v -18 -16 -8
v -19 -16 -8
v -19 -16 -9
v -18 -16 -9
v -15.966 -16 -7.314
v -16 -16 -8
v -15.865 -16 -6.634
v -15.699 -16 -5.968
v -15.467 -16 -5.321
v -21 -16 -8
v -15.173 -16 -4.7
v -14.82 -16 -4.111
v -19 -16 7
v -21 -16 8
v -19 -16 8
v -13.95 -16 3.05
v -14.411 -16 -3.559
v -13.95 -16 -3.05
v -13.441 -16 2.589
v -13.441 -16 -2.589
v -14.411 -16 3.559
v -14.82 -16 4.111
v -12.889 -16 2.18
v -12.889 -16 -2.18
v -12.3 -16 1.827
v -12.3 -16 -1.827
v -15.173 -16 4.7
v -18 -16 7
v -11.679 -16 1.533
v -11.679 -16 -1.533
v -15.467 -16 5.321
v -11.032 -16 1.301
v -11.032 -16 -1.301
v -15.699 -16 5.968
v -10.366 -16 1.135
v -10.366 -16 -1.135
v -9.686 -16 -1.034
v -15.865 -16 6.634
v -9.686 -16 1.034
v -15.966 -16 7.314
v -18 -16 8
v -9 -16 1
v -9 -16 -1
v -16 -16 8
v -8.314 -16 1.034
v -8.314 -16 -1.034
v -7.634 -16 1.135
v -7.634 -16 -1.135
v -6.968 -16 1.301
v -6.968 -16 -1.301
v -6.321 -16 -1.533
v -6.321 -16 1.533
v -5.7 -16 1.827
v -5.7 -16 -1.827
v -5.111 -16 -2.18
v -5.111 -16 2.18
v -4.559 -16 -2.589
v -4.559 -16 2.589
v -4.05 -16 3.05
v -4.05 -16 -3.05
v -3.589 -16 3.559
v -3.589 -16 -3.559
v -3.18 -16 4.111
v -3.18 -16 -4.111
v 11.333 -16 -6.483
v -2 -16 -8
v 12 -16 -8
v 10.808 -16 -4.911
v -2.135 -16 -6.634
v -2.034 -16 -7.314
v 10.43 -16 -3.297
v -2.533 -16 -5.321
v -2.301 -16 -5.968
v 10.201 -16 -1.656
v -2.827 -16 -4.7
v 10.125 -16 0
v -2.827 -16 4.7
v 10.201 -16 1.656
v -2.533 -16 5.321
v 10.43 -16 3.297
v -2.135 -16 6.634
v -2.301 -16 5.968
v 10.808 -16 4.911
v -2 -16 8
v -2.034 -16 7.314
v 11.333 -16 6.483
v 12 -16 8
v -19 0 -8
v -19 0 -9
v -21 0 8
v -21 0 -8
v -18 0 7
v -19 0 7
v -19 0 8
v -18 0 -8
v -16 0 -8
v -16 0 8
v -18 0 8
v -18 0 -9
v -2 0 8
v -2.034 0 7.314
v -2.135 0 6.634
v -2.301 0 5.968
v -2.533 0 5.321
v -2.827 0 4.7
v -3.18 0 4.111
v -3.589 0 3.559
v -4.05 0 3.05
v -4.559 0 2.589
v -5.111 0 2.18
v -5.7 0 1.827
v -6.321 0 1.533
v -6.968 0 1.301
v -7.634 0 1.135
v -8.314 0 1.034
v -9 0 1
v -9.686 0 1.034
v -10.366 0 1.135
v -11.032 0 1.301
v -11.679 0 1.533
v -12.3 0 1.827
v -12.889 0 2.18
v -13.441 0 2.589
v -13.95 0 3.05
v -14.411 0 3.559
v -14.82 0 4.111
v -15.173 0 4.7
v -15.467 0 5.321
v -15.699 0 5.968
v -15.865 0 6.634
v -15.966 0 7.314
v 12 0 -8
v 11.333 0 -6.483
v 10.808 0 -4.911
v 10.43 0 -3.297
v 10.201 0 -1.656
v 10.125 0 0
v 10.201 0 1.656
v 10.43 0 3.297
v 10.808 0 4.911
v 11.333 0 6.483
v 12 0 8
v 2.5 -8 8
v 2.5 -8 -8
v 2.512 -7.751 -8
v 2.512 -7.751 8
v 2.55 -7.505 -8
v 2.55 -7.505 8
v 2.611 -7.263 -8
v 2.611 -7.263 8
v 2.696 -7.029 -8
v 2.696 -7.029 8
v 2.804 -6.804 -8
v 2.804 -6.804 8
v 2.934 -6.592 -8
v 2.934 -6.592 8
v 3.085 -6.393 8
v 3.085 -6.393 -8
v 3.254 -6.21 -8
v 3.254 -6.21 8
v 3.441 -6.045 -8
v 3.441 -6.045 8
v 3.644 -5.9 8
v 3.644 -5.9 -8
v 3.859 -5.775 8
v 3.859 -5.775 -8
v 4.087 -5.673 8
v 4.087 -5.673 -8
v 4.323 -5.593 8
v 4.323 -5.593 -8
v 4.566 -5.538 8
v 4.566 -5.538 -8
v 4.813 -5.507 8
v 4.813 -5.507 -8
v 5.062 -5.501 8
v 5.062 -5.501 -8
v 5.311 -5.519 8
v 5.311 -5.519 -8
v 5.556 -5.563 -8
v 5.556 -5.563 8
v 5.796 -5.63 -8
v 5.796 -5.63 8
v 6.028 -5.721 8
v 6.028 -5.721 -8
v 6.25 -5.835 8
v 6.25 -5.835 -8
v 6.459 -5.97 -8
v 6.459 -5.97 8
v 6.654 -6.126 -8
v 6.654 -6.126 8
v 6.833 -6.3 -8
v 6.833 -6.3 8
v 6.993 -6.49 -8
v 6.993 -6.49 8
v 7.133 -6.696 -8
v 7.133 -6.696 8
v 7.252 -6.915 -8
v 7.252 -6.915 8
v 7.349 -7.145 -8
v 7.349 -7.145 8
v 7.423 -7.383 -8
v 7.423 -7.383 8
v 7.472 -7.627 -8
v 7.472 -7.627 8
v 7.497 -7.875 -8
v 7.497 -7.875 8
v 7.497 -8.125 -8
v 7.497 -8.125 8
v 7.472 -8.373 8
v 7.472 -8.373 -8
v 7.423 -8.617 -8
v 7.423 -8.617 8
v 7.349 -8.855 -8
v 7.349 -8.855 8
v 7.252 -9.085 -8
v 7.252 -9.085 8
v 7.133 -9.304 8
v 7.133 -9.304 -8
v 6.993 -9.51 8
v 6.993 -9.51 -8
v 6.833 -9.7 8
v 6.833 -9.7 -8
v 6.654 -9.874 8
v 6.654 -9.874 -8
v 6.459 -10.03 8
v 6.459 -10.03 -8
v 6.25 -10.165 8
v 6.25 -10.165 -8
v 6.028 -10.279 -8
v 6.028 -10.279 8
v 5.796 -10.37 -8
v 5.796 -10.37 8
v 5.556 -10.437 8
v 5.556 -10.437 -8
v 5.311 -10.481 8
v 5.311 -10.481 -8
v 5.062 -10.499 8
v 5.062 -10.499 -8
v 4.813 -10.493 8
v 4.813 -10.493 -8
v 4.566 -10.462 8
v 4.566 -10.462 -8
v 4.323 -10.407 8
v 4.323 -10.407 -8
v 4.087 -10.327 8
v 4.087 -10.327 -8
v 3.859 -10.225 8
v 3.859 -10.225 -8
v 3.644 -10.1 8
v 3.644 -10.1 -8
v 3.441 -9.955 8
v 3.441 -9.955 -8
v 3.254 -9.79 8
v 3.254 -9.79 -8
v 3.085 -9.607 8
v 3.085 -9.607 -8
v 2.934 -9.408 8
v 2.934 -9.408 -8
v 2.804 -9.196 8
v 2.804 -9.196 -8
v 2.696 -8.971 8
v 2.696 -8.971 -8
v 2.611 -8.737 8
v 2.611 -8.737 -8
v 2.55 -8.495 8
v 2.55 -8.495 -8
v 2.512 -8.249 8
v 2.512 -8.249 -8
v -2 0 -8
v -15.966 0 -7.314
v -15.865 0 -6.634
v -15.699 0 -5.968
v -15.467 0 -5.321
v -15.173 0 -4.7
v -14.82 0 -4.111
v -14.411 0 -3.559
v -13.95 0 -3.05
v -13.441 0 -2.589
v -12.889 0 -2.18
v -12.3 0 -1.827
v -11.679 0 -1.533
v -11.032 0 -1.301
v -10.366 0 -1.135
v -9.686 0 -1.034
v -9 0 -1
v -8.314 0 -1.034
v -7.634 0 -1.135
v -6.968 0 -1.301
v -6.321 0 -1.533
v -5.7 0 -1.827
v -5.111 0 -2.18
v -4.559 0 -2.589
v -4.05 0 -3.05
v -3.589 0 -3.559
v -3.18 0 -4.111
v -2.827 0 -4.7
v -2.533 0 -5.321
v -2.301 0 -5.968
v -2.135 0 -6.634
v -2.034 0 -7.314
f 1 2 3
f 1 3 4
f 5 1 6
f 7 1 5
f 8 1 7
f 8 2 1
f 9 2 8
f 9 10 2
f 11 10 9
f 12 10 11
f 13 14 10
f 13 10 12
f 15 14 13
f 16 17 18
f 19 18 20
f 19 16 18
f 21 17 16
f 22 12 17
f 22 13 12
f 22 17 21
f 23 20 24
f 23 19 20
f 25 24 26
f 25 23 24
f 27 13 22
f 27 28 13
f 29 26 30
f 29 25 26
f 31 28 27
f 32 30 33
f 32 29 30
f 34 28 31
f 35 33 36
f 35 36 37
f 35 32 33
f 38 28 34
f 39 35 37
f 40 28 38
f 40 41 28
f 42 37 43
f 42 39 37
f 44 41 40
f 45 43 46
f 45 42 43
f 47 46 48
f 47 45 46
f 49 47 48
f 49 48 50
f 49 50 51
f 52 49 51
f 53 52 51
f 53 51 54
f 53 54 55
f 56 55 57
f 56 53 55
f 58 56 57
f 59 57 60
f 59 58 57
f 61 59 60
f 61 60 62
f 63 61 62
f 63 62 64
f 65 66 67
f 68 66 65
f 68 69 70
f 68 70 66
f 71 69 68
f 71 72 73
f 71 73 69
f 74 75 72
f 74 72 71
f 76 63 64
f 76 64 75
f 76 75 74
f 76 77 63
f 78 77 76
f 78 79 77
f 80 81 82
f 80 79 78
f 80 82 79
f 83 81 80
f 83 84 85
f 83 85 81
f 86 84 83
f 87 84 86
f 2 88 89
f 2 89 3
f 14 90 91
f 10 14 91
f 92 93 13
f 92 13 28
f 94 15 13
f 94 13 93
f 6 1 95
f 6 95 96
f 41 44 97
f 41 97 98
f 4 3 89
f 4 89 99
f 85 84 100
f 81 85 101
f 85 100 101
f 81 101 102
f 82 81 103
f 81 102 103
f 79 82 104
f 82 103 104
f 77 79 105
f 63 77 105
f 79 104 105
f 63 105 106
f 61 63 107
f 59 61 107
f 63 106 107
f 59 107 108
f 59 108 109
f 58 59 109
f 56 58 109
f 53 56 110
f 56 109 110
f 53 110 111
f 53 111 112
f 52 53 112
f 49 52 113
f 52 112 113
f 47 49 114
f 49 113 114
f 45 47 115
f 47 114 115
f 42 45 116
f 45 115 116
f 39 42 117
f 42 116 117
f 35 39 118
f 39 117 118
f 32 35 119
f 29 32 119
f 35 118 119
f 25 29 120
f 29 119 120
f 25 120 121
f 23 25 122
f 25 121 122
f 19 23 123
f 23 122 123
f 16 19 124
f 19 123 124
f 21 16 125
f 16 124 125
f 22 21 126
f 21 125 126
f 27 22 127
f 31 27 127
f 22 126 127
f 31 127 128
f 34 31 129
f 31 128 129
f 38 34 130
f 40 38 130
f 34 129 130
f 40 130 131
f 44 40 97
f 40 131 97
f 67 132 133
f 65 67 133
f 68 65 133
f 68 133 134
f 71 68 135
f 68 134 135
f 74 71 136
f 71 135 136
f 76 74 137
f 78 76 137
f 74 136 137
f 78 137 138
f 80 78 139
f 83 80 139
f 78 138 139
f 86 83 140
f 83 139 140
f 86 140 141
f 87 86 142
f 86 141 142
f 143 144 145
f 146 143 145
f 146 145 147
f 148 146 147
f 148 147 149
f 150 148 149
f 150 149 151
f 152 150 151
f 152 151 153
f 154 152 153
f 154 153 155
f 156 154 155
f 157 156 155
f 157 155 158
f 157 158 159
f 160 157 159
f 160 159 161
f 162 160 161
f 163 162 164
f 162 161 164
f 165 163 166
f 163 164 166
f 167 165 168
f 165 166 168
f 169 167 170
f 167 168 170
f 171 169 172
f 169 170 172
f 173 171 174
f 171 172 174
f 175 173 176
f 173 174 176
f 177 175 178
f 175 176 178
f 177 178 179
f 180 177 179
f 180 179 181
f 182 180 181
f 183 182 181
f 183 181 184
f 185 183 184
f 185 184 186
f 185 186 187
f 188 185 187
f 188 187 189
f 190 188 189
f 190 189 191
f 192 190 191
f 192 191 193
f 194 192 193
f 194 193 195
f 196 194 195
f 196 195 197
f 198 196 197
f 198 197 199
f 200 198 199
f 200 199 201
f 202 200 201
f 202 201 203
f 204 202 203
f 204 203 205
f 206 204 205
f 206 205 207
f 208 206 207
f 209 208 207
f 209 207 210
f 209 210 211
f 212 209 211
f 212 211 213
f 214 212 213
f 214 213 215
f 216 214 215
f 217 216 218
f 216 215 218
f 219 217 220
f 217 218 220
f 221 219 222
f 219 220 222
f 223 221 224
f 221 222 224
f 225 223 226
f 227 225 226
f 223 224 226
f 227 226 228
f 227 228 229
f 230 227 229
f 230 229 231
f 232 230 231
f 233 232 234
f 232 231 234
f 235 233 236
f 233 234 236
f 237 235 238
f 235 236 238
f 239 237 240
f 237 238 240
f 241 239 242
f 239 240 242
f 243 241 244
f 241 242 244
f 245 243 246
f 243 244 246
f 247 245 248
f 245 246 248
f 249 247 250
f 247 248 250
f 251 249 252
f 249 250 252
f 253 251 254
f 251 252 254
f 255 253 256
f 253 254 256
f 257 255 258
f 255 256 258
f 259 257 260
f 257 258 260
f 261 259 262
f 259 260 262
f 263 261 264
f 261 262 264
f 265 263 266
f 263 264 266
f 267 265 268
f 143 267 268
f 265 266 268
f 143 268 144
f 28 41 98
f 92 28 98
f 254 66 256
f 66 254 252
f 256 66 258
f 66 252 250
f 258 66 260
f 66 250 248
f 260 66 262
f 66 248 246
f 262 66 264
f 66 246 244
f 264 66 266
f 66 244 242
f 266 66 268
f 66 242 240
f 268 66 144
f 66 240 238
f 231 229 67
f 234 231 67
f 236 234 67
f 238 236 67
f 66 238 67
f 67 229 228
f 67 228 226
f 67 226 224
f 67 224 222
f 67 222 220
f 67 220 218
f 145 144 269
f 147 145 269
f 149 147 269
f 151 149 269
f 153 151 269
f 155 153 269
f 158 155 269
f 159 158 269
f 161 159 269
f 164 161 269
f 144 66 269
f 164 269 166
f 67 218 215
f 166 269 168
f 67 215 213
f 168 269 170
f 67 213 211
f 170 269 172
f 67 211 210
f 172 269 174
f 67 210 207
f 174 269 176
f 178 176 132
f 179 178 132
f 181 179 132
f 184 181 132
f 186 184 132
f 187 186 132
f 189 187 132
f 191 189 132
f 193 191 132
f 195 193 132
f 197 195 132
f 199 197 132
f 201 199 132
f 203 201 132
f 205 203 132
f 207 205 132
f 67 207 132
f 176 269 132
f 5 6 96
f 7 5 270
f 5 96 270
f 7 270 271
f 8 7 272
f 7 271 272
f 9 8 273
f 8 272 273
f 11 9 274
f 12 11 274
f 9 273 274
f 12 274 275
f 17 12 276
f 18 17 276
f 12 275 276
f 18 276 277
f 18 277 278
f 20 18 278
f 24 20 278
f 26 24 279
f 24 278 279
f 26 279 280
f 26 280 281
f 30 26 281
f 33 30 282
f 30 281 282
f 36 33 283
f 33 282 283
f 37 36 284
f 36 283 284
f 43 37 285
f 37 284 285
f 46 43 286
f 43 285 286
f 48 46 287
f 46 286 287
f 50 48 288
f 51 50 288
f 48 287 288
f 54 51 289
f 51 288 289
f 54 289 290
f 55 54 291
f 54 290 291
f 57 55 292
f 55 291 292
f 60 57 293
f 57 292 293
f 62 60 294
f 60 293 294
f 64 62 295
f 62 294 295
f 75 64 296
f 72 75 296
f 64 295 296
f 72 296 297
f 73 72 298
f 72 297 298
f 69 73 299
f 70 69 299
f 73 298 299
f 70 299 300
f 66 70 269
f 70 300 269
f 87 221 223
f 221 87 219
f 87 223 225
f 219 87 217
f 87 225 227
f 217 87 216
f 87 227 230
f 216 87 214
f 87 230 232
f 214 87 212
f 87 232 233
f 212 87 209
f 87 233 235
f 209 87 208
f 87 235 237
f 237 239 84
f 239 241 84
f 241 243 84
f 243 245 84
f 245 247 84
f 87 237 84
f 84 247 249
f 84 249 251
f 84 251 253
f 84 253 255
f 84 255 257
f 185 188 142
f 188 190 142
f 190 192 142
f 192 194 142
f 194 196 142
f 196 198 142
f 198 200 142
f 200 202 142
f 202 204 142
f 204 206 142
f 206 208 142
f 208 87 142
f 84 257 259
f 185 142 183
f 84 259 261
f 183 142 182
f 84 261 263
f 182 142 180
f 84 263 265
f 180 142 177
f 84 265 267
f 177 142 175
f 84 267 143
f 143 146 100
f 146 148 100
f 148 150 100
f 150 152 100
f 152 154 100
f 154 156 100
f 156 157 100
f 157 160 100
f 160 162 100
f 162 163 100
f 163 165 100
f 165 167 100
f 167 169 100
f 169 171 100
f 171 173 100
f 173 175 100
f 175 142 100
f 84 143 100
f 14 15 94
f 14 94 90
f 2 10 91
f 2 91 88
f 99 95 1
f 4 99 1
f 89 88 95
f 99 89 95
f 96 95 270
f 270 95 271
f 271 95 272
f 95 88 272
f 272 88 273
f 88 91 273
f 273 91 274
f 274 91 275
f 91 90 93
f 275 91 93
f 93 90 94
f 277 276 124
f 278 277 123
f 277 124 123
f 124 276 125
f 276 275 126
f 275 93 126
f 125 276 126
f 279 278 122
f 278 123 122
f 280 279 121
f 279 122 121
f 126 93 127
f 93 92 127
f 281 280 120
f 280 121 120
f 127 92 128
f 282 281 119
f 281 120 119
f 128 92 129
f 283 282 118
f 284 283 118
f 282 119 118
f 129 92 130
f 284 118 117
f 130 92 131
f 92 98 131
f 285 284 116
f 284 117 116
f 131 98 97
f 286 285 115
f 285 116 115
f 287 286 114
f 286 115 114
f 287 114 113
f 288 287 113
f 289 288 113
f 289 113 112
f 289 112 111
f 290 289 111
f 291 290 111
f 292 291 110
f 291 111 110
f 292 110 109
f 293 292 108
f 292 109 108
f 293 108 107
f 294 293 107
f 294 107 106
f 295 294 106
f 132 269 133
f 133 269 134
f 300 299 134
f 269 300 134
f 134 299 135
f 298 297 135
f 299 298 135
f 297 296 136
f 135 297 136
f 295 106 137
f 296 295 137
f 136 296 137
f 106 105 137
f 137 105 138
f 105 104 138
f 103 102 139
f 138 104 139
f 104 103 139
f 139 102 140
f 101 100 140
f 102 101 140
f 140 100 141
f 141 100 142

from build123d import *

# Parameters (mm, degrees)
F1_DEPTH = 16
F3_D     = 5
F4_W     = 1
F4_H     = 16
F5_DEPTH = 1
F6_W     = 1
F6_H     = 16
F7_DEPTH = 1


# Not quite as in the source:
# - a feature names something its author has since deleted; it is built from what else it names


with BuildPart() as f1:
    # F0 (on Front) → F1 (new body)
    with BuildSketch(Plane.XZ):
        with BuildLine():
            Line((-21, 8), (-21, -8))
            Line((-21, -8), (-16, -8))
            ThreePointArc((-16, -8), (-9, -1), (-2, -8))
            Line((-2, -8), (12.0004845034, -8))
            ThreePointArc((12.0004845034, -8), (10.125, 0), (12.0004845034, 8))
            Line((12.0004845034, 8), (-2, 8))
            ThreePointArc((-2, 8), (-9, 1), (-16, 8))
            Line((-16, 8), (-21, 8))
        make_face()
    extrude(amount=F1_DEPTH)

    # F3 (through all)
    with Locations(Plane.XY.offset(8)):
        with Locations((5, -8)):
            Hole(F3_D / 2)

    # F4 (on face) → F5 (cut)
    with BuildSketch(Plane.XY.offset(8)):
        with Locations((-18.5, -8)):
            Rectangle(F4_W, F4_H)
    extrude(amount=-F5_DEPTH, mode=Mode.SUBTRACT)

    # F6 (on face) → F7 (join)
    with BuildSketch(Plane(origin=(0, 0, -8), x_dir=(1, 0, 0), z_dir=(0, 0, -1))):
        with Locations((-18.5, 8)):
            Rectangle(F6_W, F6_H)
    extrude(amount=F7_DEPTH)


solid = f1.part
